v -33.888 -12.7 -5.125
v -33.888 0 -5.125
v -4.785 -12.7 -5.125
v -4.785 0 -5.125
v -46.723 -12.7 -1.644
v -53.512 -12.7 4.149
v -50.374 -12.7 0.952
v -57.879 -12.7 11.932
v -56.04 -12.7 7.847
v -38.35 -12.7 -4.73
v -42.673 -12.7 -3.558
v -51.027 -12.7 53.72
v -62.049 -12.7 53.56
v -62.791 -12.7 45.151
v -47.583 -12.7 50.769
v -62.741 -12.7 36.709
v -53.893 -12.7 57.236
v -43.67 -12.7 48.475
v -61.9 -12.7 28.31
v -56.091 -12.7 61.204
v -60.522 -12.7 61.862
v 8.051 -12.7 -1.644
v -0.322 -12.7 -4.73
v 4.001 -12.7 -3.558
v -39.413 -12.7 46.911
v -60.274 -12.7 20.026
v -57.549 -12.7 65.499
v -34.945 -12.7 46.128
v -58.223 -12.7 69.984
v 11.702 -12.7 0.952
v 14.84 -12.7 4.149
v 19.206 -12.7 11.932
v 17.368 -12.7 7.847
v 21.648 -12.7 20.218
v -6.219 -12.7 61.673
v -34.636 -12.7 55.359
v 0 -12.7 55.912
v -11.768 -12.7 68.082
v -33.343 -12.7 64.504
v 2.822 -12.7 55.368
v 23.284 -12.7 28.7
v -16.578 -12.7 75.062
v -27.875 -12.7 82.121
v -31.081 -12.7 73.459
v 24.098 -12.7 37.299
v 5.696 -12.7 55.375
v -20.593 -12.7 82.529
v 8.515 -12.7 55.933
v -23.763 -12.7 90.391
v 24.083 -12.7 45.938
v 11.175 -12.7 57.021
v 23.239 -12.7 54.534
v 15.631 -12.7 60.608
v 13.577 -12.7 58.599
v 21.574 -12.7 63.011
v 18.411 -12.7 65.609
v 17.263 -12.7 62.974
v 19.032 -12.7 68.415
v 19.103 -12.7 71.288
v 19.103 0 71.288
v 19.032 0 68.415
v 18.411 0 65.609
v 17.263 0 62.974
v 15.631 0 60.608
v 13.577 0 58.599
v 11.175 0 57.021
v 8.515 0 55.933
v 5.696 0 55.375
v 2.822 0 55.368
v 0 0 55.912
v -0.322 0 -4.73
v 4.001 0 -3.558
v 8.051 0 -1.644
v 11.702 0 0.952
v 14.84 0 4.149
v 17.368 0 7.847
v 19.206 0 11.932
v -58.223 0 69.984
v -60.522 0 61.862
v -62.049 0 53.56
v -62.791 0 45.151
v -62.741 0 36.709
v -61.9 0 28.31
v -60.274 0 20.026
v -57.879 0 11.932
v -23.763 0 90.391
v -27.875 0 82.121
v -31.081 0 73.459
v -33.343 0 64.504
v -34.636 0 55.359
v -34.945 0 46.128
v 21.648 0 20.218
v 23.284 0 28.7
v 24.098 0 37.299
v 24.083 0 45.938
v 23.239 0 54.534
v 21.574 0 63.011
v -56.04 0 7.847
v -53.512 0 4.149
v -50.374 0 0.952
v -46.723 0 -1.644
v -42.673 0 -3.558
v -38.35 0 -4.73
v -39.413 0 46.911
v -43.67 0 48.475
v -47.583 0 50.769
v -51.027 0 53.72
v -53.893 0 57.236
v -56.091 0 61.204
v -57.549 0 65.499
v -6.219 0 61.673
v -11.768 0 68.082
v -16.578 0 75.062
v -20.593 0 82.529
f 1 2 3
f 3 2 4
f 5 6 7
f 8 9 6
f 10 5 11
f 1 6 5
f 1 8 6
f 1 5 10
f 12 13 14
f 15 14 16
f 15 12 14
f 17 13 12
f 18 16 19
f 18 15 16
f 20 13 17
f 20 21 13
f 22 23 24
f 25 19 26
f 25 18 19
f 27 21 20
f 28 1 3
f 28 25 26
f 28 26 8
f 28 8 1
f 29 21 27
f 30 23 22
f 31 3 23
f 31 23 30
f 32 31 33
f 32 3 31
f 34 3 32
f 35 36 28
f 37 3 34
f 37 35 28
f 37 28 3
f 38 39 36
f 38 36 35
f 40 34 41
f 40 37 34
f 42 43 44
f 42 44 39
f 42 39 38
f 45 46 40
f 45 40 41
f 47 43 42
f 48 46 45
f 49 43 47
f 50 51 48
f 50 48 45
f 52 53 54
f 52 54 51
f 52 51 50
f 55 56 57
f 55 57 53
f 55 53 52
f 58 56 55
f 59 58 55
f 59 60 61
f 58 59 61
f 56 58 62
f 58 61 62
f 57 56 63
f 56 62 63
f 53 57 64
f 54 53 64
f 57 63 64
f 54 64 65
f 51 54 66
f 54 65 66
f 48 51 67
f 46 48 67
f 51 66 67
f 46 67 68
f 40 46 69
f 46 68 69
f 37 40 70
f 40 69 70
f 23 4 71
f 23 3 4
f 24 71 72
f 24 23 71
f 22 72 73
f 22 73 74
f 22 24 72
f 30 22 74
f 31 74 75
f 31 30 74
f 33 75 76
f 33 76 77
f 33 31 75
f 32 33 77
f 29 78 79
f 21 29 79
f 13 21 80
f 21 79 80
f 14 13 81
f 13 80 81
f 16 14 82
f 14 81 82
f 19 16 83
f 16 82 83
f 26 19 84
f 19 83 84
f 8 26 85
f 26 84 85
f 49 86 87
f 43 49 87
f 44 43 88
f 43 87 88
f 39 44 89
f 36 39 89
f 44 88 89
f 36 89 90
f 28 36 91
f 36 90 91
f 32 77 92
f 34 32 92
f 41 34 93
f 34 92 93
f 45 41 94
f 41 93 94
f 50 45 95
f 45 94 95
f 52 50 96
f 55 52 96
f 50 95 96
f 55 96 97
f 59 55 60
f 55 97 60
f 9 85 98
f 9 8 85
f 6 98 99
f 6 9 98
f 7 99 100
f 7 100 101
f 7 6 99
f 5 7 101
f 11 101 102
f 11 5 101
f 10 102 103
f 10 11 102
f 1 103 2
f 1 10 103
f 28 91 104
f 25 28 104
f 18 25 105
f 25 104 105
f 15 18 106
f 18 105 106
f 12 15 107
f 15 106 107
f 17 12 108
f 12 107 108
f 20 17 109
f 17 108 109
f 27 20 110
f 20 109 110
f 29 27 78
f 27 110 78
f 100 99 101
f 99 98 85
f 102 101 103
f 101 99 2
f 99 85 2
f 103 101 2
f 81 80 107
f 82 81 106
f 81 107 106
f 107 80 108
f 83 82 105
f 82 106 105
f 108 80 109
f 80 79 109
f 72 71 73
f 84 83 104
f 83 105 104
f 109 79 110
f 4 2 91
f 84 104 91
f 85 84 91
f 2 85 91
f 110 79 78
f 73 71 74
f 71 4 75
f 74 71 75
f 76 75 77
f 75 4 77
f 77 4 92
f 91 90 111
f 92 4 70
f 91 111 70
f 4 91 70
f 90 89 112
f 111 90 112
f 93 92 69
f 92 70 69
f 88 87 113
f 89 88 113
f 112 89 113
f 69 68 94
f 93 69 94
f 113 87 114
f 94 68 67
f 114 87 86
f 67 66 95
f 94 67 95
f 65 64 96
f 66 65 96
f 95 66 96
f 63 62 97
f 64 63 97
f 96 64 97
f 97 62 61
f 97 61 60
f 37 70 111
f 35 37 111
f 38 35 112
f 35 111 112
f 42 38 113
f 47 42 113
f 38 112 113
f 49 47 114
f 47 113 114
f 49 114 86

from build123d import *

# Parameters (mm, degrees)
F1_DEPTH = 12.7
F2_R     = 25.4
F3_R     = 25.4


with BuildPart() as f1:
    # F0 (on Front) → F1 (new body)
    with BuildSketch(Plane.XZ):
        with BuildLine():
            ThreePointArc((-34.945074, 46.127506), (-51.027386, 53.720366), (-58.223099, 69.984252))
            ThreePointArc((-58.223099, 69.984252), (-62.31415, 31.507538), (-49.854971, -5.125275))
            Line((-49.854971, -5.125275), (11.182429, -5.125275))
            ThreePointArc((11.182429, -5.125275), (23.71529, 32.192738), (19.103313, 71.28796))
            ThreePointArc((19.103313, 71.28796), (13.57664, 58.599304), (0, 55.912126))
            ThreePointArc((0, 55.912126), (-14.268957, 71.506168), (-23.762649, 90.391271))
            ThreePointArc((-23.762649, 90.391271), (-32.331491, 69.011631), (-34.945074, 46.127506))
        make_face()
    extrude(amount=F1_DEPTH)

    # F2
    f2_edges = [f1.edges().sort_by_distance(p)[0] for p in [
        (-49.854971, -6.35, -5.125275),
    ]]
    fillet(f2_edges, radius=F2_R)

    # F3
    f3_edges = [f1.edges().sort_by_distance(p)[0] for p in [
        (11.182429, -6.35, -5.125275),
    ]]
    fillet(f3_edges, radius=F3_R)


solid = f1.part
